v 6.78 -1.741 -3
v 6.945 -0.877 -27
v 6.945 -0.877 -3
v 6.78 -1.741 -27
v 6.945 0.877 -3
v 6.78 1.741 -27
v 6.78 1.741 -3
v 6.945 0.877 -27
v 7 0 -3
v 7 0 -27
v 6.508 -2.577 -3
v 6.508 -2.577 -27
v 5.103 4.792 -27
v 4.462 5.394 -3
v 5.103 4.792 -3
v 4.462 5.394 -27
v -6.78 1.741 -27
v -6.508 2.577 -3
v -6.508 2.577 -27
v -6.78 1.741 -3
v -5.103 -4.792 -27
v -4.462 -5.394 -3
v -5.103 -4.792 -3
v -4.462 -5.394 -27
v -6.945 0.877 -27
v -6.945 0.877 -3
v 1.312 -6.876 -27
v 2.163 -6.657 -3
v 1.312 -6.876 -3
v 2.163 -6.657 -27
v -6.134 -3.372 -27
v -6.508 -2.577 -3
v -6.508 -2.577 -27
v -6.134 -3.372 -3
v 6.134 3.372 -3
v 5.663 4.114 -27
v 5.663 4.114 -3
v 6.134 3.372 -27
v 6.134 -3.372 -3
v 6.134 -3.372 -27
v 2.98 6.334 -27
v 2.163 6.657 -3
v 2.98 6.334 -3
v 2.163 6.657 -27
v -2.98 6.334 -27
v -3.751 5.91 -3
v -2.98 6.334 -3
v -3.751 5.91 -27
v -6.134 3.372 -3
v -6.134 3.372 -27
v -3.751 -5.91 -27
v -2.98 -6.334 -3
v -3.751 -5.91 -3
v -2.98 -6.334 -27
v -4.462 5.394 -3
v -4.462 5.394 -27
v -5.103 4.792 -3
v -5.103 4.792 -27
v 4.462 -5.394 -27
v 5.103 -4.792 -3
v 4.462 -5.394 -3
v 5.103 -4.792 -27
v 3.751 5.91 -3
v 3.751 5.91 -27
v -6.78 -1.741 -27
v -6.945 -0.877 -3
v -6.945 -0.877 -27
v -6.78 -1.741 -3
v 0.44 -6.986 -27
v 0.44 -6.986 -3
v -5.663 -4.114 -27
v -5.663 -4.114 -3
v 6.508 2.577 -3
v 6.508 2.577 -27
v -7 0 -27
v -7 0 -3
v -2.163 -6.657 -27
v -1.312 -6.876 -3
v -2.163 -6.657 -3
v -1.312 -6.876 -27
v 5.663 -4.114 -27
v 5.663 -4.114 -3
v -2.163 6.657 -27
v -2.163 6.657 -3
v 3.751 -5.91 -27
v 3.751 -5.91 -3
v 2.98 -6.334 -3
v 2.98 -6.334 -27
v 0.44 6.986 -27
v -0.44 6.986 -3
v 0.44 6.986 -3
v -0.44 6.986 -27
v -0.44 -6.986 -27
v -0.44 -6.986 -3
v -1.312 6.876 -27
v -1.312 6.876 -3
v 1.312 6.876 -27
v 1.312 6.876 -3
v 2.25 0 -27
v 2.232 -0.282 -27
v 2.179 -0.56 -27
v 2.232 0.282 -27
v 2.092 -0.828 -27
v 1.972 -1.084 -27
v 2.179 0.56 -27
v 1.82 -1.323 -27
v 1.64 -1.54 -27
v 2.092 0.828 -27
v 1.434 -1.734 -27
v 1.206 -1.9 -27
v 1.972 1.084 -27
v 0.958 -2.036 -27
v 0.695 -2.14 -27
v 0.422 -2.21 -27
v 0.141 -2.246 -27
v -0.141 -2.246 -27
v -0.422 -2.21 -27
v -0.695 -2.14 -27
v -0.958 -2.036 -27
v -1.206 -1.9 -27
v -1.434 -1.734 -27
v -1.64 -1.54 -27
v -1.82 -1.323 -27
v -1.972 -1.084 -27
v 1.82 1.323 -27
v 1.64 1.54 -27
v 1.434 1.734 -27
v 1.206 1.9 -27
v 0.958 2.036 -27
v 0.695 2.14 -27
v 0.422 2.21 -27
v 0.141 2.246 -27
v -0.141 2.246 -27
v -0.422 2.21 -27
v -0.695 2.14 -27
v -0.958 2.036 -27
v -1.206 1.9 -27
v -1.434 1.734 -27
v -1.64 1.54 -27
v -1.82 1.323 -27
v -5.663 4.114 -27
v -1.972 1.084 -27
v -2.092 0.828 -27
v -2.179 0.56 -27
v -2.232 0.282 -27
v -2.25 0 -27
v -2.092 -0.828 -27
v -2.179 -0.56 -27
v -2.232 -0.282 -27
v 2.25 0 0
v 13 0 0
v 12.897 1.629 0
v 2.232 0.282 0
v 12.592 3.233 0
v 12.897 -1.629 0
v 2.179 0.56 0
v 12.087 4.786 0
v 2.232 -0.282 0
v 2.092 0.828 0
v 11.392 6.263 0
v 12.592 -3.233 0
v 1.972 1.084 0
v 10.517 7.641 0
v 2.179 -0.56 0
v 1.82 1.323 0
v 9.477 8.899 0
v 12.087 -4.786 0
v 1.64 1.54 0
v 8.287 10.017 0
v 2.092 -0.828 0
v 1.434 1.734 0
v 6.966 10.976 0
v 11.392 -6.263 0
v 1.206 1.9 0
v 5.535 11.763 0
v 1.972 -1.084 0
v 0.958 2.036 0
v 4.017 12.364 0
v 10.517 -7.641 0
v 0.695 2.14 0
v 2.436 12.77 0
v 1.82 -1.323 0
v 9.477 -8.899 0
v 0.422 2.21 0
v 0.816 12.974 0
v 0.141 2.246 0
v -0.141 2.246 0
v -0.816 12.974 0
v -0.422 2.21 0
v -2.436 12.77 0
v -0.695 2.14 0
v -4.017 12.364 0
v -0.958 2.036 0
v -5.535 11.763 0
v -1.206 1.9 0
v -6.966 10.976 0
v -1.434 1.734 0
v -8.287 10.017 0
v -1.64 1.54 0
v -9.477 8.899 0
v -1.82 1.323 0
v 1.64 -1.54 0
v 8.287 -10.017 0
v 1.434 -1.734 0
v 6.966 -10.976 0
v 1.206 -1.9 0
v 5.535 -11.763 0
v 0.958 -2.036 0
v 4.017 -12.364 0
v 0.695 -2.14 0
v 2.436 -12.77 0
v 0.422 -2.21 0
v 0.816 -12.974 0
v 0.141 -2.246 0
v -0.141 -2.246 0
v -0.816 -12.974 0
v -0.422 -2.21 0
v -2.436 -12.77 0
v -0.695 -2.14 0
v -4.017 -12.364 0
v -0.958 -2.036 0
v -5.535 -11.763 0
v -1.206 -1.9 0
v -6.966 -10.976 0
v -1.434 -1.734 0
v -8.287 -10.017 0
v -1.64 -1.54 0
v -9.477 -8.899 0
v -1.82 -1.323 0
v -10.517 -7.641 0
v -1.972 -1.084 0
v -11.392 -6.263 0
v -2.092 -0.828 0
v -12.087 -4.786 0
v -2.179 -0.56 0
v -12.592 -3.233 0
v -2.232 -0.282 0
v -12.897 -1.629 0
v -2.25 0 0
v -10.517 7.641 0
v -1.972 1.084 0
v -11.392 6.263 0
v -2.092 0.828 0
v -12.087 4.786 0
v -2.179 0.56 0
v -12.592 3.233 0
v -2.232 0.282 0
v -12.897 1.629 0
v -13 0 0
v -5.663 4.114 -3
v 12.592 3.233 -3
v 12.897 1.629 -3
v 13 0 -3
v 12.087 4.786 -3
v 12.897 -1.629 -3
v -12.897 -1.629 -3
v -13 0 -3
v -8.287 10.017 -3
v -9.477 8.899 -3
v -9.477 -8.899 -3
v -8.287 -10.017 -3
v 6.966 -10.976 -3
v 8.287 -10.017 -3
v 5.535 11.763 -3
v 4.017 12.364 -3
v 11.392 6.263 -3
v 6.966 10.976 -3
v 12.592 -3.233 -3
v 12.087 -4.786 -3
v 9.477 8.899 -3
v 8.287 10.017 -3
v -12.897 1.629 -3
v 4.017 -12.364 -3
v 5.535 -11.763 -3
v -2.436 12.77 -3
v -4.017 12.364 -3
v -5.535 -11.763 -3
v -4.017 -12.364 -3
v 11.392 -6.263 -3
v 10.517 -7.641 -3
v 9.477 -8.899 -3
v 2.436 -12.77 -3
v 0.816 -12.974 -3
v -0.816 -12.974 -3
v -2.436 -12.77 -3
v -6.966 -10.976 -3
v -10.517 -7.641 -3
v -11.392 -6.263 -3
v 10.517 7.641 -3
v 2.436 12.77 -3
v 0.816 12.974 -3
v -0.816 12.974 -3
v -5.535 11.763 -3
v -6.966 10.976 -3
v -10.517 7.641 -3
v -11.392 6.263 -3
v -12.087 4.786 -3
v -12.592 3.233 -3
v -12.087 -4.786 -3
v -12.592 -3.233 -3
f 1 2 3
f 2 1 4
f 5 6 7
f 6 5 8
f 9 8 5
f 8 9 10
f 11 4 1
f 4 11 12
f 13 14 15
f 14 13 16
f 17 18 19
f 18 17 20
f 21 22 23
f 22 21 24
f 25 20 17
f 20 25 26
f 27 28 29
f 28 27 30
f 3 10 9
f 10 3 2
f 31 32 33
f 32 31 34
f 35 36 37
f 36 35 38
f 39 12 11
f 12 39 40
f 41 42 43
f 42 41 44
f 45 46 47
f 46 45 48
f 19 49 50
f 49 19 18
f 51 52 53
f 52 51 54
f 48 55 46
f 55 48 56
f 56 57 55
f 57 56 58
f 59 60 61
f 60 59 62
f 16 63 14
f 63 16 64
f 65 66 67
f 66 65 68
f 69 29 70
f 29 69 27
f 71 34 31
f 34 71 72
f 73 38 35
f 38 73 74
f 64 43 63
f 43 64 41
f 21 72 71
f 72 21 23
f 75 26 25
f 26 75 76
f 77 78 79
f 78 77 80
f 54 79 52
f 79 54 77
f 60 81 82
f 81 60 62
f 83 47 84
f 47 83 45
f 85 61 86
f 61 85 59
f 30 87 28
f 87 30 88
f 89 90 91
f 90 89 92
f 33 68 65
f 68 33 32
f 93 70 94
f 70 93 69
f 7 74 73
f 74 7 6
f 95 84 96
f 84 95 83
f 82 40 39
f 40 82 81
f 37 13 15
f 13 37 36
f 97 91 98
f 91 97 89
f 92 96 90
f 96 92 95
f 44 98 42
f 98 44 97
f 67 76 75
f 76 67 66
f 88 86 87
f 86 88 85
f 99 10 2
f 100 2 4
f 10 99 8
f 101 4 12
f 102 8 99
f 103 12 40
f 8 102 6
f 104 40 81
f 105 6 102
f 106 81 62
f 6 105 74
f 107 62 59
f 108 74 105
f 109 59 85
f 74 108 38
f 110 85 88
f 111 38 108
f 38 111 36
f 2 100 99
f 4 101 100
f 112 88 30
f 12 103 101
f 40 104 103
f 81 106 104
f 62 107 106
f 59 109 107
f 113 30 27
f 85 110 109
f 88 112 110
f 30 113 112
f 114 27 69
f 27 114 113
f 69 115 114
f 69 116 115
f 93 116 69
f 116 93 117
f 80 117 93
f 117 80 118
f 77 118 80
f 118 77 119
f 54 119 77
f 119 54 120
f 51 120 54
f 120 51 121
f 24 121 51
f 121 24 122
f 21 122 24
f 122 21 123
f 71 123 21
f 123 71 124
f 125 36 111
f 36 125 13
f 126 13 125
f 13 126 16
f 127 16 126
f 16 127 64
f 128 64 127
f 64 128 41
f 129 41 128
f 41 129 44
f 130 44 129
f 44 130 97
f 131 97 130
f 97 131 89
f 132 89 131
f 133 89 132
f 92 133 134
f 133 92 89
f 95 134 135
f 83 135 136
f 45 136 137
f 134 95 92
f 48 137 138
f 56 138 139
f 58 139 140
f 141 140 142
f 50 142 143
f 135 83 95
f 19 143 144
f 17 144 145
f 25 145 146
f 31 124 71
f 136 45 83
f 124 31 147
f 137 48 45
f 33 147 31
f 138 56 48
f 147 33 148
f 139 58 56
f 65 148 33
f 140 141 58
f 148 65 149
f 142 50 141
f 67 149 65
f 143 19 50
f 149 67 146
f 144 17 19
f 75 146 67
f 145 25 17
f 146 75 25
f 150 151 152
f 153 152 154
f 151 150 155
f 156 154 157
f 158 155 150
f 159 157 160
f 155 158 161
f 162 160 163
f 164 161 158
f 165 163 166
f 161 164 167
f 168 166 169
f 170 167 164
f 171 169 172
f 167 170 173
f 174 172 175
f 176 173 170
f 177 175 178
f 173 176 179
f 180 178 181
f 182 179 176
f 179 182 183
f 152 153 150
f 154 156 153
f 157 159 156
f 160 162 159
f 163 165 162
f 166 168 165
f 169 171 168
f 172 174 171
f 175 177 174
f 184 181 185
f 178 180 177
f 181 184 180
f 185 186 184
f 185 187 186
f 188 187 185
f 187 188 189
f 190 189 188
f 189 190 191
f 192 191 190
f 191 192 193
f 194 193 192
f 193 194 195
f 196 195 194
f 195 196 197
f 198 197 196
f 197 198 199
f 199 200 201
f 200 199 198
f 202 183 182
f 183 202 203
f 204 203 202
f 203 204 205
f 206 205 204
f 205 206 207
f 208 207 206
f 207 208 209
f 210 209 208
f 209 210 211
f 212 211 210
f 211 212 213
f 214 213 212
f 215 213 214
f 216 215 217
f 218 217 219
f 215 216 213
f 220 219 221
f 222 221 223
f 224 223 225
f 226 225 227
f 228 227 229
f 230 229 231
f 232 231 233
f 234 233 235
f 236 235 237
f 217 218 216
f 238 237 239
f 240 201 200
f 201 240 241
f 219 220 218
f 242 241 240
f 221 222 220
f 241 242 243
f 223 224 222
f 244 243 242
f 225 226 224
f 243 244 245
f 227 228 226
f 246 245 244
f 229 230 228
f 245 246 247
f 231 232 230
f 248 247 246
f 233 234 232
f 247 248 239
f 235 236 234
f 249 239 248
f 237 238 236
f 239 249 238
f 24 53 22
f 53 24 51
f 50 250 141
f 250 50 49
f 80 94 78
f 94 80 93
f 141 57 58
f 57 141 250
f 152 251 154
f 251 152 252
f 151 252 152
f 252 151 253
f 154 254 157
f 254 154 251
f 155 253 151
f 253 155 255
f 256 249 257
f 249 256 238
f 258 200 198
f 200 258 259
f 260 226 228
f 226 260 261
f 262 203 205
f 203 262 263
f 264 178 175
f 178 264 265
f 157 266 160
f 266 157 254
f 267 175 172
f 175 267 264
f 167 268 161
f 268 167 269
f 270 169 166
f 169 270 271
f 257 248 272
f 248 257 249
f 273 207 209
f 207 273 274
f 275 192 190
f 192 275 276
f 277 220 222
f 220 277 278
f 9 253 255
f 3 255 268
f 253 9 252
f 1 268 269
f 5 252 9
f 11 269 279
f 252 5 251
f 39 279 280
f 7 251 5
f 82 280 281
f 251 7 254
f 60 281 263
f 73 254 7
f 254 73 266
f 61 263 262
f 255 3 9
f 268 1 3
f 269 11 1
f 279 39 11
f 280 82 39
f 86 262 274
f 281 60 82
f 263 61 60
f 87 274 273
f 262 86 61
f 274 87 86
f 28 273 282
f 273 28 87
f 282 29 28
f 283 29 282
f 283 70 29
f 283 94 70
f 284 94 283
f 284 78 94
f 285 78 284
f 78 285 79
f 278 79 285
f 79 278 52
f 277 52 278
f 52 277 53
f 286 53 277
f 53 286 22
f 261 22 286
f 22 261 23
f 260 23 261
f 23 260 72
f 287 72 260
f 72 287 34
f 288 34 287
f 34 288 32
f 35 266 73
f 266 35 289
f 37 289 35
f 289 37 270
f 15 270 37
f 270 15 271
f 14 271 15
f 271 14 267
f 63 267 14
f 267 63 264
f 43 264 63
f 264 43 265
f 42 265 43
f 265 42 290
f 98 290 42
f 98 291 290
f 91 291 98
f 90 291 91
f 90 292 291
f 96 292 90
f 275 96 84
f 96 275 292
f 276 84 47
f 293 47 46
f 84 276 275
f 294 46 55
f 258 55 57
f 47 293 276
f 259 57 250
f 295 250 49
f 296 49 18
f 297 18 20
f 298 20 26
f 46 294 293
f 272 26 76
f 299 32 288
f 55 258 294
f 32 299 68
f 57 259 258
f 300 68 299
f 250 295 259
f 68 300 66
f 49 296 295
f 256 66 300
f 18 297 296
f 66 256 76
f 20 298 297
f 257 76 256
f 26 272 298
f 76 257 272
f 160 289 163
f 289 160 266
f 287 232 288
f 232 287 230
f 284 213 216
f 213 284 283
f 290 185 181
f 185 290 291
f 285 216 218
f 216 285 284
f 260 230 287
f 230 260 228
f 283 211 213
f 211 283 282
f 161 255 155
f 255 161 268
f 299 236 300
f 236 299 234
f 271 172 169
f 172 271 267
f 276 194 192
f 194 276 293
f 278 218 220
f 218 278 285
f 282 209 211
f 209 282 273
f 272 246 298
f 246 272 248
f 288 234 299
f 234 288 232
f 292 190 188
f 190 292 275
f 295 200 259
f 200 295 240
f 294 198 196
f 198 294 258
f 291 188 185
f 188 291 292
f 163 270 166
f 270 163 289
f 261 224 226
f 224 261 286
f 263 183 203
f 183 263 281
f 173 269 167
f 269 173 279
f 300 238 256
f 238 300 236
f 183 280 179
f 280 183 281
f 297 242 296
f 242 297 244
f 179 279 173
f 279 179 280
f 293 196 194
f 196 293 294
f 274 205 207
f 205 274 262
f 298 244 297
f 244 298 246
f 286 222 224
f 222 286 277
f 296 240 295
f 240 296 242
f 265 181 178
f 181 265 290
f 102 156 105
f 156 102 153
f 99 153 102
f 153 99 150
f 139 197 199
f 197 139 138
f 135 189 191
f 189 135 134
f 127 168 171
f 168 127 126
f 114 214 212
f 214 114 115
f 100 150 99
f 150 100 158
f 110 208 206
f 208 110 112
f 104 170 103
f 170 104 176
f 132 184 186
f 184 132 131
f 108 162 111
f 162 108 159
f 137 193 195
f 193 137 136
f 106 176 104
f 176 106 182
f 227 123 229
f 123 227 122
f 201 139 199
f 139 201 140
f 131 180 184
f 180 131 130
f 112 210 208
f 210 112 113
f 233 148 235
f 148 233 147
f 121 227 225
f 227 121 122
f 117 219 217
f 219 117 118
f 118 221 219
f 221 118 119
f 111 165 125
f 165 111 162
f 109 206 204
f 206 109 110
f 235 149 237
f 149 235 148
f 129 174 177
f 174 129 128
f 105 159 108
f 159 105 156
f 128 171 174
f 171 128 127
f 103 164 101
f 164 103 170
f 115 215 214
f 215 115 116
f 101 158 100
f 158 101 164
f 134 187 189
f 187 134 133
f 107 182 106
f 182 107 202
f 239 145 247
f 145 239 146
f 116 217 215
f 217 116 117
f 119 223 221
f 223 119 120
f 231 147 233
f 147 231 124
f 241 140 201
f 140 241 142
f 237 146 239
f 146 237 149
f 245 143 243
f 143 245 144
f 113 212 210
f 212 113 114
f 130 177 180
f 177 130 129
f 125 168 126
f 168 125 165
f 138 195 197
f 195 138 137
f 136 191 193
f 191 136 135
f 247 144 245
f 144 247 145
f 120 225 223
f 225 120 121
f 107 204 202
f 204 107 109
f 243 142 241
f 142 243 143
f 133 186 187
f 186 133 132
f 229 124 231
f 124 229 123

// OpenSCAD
$fn = 50;


difference() {
	union() {
		translate(v = [0, 0, -27.0000000000]) {
			cylinder(h = 27, r = 7.0000000000);
		}
		translate(v = [0, 0, -3.0000000000]) {
			cylinder(h = 3, r = 13.0000000000);
		}
	}
	union() {
		#translate(v = [0, 0, -27]) {
			cylinder(h = 27, r = 2.2500000000);
		}
	}
}
